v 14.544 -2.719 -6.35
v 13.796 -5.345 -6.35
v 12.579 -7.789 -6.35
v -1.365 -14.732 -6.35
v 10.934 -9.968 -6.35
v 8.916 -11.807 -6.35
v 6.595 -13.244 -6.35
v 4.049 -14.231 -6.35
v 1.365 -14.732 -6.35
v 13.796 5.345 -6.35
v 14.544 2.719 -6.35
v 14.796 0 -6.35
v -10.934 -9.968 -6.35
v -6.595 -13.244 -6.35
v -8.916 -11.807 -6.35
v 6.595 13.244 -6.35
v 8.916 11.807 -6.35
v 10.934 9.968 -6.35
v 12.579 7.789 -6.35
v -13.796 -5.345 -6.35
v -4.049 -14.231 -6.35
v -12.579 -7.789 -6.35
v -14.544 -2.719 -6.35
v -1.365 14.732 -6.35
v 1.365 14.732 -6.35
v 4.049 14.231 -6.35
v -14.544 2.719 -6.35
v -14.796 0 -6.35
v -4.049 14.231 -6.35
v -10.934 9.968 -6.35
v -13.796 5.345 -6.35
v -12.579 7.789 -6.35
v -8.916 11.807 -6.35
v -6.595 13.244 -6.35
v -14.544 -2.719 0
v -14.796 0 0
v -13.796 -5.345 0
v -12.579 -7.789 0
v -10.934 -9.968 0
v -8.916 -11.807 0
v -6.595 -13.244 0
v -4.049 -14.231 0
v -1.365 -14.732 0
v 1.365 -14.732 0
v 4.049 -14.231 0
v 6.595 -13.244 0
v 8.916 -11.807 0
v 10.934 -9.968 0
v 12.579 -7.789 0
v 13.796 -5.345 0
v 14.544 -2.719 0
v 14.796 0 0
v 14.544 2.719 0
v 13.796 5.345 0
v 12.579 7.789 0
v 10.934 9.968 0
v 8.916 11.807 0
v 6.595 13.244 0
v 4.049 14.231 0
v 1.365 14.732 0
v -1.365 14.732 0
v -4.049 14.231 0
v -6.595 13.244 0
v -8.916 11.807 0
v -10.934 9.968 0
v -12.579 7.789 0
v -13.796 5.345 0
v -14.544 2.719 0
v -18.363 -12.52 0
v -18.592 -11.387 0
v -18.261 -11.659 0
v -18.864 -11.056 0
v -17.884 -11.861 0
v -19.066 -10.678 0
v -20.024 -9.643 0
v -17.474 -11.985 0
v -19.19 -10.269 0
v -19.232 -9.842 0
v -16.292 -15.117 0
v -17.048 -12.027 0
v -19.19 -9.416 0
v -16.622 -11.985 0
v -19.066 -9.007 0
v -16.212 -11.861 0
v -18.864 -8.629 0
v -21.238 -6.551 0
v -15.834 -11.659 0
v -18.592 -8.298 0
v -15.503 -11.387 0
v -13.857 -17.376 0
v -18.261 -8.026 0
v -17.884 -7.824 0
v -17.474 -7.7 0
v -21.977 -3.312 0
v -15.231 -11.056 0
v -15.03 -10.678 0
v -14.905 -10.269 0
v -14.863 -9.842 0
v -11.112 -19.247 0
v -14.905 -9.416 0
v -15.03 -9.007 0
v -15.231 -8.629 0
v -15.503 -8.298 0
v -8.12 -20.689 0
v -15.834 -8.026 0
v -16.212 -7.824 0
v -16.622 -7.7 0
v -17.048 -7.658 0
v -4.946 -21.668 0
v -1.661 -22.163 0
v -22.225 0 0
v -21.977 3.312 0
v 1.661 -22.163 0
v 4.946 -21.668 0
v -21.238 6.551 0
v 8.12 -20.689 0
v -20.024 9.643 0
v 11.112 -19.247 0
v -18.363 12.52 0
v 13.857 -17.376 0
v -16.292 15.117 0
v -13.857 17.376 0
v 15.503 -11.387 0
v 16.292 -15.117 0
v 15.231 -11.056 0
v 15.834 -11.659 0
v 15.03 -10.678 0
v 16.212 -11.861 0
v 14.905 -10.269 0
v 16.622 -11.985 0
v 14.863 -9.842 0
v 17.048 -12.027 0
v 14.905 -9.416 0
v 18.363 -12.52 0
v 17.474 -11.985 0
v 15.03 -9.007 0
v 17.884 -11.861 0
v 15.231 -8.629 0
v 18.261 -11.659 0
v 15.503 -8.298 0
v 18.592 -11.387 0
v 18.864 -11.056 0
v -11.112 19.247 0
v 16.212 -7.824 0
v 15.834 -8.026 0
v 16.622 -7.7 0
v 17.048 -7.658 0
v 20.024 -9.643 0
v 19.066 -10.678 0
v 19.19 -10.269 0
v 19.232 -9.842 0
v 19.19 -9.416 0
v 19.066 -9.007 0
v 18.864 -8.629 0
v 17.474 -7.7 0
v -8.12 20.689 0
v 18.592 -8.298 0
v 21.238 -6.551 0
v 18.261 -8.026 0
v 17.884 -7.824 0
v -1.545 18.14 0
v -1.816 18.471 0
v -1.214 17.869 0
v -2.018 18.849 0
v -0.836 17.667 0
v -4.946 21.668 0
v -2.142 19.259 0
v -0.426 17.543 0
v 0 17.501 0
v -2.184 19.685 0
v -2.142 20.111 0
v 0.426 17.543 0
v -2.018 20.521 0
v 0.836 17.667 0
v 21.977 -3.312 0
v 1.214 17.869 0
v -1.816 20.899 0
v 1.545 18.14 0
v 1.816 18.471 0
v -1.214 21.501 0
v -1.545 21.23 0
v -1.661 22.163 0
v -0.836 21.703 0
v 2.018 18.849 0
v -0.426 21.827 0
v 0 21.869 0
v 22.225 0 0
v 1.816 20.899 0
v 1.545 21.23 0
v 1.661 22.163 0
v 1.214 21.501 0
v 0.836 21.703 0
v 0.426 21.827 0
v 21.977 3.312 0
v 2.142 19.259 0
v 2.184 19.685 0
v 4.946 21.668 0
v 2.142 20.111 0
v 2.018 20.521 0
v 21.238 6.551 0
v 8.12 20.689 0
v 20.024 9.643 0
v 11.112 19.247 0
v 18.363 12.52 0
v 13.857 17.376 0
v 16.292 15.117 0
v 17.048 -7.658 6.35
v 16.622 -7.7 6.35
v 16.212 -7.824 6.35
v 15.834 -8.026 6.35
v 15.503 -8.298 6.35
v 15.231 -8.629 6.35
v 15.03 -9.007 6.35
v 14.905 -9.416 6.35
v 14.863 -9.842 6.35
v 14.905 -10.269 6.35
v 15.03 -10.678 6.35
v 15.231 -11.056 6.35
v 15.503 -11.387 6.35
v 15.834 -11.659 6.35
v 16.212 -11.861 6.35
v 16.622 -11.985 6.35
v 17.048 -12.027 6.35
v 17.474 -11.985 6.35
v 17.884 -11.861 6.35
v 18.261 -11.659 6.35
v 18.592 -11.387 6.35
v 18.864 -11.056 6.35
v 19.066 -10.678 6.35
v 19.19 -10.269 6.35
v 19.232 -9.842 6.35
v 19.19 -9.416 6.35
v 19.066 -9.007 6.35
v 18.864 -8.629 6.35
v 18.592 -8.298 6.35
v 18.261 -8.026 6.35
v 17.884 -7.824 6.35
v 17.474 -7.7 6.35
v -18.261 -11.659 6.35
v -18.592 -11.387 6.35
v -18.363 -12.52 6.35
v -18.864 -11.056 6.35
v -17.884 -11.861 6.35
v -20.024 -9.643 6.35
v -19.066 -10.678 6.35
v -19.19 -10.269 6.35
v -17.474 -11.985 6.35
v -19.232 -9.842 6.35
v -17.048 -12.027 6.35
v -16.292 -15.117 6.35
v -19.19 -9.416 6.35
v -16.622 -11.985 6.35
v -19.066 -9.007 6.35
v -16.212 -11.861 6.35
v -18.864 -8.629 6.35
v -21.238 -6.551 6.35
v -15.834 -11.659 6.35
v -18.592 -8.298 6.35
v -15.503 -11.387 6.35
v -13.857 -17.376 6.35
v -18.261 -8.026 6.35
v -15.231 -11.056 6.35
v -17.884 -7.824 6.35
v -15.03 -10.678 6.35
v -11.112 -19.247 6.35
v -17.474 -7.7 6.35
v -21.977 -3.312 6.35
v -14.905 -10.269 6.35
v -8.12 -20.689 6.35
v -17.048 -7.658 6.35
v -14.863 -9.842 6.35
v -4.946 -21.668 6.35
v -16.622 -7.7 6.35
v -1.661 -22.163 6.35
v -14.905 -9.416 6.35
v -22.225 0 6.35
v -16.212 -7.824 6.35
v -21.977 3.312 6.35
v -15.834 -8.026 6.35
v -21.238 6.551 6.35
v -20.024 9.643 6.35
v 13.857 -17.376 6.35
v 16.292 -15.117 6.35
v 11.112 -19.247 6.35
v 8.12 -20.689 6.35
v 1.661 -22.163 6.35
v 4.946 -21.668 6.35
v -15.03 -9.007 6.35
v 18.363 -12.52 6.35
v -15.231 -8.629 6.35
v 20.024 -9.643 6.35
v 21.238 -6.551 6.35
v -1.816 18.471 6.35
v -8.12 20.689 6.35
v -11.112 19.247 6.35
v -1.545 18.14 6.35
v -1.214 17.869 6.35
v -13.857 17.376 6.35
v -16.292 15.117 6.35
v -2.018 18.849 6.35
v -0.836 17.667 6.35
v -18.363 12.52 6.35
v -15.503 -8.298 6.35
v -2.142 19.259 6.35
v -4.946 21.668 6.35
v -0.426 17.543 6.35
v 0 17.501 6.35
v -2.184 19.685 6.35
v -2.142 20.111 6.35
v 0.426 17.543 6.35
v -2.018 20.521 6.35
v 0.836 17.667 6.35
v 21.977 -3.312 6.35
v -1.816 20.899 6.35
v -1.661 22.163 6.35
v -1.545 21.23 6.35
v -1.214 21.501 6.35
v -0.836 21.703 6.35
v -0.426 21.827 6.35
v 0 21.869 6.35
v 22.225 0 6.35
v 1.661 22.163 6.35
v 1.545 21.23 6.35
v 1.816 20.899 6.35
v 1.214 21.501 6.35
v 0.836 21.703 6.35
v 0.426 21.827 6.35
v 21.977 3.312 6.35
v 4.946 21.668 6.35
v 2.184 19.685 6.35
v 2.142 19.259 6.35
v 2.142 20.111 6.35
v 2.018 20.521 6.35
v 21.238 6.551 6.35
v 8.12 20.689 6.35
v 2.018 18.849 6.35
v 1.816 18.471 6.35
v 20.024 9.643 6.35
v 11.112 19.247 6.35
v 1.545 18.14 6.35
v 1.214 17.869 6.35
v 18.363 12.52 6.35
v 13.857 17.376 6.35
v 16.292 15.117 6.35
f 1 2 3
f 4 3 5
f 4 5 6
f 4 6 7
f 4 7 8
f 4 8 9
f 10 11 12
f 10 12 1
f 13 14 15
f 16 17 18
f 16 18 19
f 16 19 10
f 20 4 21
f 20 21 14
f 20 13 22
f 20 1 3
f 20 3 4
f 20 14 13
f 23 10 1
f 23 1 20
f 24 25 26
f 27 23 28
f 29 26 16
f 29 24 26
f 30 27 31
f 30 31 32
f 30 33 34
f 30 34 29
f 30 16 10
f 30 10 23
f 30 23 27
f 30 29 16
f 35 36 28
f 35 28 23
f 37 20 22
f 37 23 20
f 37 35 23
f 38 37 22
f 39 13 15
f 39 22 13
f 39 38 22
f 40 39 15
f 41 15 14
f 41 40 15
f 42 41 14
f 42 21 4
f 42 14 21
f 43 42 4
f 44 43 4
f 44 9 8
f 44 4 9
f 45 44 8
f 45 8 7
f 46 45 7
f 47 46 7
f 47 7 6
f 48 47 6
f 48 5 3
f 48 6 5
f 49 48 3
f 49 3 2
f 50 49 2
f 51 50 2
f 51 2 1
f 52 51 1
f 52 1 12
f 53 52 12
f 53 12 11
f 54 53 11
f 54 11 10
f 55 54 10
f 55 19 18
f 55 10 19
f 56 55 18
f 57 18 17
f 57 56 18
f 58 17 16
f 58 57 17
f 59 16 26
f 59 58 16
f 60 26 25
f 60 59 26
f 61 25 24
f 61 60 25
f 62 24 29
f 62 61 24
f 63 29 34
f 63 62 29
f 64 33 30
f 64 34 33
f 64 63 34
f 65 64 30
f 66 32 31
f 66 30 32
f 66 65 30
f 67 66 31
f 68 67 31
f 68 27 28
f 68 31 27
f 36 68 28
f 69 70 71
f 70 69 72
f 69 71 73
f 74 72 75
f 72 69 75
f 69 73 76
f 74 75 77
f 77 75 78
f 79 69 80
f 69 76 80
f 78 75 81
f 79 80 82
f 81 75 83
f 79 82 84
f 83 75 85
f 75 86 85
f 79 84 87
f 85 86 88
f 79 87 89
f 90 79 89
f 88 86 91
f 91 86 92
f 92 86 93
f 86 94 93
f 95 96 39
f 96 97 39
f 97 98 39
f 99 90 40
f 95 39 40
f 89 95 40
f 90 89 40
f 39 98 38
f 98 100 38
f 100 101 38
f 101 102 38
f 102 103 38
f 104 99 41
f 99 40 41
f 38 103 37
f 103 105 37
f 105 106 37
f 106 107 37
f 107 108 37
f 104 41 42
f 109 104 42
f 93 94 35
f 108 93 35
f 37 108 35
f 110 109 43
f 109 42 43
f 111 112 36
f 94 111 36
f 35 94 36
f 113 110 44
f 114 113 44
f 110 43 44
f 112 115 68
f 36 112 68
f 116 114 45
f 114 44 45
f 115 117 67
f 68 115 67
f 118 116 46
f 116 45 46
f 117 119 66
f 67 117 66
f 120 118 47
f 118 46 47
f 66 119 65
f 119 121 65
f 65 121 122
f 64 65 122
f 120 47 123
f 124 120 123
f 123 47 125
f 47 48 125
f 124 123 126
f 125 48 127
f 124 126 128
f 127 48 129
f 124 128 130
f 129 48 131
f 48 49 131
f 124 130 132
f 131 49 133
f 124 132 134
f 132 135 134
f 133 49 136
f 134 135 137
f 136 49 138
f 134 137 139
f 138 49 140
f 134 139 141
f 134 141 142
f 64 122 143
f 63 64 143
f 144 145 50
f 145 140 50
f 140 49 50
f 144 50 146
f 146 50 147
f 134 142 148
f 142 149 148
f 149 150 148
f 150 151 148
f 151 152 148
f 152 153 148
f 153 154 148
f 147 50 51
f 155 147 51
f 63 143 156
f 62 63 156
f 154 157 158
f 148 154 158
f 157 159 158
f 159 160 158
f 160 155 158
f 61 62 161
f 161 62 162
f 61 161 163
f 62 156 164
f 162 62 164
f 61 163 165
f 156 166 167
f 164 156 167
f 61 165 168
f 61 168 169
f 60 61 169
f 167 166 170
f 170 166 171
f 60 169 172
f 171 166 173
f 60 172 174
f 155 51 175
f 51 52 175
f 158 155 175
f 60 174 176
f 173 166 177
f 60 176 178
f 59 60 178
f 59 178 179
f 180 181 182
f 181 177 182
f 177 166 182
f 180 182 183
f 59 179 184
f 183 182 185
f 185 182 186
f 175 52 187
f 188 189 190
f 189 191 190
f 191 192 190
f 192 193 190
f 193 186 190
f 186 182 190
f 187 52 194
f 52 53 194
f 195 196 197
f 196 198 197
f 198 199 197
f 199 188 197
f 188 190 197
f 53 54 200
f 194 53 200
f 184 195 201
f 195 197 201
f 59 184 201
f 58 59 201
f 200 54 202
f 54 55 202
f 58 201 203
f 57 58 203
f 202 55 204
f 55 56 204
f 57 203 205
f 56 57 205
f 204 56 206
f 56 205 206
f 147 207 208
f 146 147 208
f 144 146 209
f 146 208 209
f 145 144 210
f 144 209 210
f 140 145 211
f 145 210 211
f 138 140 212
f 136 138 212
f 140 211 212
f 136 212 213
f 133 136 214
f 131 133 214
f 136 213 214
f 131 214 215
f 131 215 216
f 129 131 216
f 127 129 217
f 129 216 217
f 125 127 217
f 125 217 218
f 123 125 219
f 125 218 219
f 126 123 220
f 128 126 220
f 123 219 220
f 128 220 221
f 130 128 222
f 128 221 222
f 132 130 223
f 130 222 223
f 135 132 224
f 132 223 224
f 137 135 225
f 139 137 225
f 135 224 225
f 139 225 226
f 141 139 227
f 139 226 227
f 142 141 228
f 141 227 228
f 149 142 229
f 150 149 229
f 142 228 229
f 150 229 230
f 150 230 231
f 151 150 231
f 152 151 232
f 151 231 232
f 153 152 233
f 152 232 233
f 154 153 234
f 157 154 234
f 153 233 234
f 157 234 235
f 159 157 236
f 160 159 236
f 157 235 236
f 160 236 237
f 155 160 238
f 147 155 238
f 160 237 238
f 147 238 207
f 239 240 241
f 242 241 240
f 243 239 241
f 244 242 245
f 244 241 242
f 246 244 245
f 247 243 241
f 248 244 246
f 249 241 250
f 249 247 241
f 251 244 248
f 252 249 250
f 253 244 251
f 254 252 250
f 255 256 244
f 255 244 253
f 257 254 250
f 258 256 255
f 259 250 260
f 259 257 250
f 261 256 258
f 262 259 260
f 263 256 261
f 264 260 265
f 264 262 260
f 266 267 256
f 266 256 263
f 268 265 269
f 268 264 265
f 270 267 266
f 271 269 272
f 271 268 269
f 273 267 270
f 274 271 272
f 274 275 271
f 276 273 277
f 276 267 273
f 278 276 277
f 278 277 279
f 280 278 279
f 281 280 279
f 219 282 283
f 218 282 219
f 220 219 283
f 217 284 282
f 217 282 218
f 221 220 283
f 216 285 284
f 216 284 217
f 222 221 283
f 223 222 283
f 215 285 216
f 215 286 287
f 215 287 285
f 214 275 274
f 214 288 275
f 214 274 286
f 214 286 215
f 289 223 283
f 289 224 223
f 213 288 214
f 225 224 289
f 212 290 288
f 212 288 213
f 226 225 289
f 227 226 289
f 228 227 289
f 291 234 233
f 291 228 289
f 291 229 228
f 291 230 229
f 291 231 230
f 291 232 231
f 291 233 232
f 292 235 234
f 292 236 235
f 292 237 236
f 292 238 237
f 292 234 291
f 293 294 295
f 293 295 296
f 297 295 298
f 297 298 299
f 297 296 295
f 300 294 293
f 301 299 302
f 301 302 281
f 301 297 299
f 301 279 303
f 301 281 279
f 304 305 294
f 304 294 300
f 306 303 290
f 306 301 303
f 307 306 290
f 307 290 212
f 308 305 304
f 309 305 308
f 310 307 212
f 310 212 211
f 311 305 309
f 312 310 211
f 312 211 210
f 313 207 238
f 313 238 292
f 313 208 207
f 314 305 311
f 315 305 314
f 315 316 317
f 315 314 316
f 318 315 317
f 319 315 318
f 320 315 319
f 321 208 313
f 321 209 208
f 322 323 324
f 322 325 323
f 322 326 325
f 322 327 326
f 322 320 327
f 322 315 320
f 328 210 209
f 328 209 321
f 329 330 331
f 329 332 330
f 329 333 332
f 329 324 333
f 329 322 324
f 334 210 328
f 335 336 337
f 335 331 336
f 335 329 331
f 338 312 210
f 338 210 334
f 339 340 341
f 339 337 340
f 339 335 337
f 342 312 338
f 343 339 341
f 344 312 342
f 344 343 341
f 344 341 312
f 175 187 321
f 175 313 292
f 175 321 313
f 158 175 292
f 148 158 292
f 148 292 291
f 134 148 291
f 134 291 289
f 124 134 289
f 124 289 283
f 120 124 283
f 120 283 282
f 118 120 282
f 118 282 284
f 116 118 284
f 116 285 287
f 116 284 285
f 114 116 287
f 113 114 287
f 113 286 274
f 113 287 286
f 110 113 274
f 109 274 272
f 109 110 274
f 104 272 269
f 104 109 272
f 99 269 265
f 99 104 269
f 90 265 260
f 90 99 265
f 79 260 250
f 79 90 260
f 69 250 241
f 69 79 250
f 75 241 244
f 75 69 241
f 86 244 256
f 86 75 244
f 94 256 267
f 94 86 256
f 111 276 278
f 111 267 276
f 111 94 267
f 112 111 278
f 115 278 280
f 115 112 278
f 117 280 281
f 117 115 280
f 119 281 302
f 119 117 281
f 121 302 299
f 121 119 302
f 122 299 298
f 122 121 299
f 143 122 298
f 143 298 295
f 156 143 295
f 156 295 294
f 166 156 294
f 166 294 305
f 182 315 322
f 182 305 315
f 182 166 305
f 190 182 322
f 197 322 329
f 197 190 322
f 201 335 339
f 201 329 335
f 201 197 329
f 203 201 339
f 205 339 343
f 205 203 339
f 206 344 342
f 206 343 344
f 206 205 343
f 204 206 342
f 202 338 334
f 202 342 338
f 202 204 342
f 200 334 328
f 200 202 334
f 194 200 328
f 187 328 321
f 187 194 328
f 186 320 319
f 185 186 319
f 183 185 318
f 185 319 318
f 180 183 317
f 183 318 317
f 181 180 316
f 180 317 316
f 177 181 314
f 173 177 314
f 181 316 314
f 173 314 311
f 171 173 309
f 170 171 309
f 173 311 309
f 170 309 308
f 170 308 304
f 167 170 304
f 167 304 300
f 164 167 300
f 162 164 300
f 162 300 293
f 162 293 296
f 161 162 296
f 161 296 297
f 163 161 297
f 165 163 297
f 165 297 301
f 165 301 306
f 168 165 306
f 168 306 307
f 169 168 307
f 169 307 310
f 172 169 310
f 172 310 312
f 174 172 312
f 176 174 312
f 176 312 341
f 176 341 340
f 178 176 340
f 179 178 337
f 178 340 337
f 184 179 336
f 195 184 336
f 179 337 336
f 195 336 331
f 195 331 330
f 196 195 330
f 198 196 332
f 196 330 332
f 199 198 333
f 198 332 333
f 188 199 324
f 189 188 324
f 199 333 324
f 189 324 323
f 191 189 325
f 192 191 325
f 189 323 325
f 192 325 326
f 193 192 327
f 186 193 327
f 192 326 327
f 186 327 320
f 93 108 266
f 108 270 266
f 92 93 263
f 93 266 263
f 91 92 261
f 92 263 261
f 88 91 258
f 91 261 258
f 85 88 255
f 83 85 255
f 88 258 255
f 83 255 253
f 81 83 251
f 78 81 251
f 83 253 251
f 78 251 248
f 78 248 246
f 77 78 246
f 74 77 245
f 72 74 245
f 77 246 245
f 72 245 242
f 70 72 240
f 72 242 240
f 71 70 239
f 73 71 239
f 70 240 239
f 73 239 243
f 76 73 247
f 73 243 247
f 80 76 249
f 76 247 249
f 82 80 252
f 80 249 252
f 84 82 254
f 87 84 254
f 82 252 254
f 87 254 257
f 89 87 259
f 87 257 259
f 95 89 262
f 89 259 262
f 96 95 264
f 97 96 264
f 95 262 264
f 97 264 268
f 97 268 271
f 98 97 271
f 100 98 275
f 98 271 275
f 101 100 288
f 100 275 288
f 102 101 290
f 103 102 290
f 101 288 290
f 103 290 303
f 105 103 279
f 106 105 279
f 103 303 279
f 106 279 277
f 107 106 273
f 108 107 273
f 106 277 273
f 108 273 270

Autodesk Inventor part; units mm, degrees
ref_plane "YZ Plane" through (0, 0, 0) normal (1, 0, 0) x (0, 1, 0)
ref_plane "XZ Plane" through (0, 0, 0) normal (0, 1, 0) x (-1, 0, 0)
ref_plane "XY Plane" through (0, 0, 0) normal (0, 0, 1) x (1, 0, 0)
sketch "Sketch1" plane through (0, 0, 0) normal (0, 0, 1) x (1, 0, 0)
  circle A0 centre (0, 0) radius 22.225
  circle A1 centre (0, 0) radius 19.685 construction
  circle A2 centre (0, 0) radius 19.685 construction
  circle A3 centre (0, 0) radius 19.685 construction
  point P0 (0, 19.685)
  point P1 (-17.0477, -9.8425)
  point P2 (17.0477, -9.8425)
  dimension "d1" = 39.37
  dimension "d0" = 44.45
  dimension "d4" = 360
extrude "Extrusion1" add sketch "Sketch1" along normal blind 6.35
sketch "Sketch2" plane through (0, 0, 0) normal (0, 0, -1) x (-1, 0, 0)
  circle A0 centre (0, 0) radius 14.7955
  dimension "d8" = 29.591
extrude "Extrusion2" add sketch "Sketch2" along normal blind 6.35
hole "Hole1" at (0, 19.685, 0) at (-17.0477, -9.8425, 0) at (17.0477, -9.8425, 0) direction (0, 0, 1) diameter 4.3688 end through all
properties part number "7.1 Q6"
